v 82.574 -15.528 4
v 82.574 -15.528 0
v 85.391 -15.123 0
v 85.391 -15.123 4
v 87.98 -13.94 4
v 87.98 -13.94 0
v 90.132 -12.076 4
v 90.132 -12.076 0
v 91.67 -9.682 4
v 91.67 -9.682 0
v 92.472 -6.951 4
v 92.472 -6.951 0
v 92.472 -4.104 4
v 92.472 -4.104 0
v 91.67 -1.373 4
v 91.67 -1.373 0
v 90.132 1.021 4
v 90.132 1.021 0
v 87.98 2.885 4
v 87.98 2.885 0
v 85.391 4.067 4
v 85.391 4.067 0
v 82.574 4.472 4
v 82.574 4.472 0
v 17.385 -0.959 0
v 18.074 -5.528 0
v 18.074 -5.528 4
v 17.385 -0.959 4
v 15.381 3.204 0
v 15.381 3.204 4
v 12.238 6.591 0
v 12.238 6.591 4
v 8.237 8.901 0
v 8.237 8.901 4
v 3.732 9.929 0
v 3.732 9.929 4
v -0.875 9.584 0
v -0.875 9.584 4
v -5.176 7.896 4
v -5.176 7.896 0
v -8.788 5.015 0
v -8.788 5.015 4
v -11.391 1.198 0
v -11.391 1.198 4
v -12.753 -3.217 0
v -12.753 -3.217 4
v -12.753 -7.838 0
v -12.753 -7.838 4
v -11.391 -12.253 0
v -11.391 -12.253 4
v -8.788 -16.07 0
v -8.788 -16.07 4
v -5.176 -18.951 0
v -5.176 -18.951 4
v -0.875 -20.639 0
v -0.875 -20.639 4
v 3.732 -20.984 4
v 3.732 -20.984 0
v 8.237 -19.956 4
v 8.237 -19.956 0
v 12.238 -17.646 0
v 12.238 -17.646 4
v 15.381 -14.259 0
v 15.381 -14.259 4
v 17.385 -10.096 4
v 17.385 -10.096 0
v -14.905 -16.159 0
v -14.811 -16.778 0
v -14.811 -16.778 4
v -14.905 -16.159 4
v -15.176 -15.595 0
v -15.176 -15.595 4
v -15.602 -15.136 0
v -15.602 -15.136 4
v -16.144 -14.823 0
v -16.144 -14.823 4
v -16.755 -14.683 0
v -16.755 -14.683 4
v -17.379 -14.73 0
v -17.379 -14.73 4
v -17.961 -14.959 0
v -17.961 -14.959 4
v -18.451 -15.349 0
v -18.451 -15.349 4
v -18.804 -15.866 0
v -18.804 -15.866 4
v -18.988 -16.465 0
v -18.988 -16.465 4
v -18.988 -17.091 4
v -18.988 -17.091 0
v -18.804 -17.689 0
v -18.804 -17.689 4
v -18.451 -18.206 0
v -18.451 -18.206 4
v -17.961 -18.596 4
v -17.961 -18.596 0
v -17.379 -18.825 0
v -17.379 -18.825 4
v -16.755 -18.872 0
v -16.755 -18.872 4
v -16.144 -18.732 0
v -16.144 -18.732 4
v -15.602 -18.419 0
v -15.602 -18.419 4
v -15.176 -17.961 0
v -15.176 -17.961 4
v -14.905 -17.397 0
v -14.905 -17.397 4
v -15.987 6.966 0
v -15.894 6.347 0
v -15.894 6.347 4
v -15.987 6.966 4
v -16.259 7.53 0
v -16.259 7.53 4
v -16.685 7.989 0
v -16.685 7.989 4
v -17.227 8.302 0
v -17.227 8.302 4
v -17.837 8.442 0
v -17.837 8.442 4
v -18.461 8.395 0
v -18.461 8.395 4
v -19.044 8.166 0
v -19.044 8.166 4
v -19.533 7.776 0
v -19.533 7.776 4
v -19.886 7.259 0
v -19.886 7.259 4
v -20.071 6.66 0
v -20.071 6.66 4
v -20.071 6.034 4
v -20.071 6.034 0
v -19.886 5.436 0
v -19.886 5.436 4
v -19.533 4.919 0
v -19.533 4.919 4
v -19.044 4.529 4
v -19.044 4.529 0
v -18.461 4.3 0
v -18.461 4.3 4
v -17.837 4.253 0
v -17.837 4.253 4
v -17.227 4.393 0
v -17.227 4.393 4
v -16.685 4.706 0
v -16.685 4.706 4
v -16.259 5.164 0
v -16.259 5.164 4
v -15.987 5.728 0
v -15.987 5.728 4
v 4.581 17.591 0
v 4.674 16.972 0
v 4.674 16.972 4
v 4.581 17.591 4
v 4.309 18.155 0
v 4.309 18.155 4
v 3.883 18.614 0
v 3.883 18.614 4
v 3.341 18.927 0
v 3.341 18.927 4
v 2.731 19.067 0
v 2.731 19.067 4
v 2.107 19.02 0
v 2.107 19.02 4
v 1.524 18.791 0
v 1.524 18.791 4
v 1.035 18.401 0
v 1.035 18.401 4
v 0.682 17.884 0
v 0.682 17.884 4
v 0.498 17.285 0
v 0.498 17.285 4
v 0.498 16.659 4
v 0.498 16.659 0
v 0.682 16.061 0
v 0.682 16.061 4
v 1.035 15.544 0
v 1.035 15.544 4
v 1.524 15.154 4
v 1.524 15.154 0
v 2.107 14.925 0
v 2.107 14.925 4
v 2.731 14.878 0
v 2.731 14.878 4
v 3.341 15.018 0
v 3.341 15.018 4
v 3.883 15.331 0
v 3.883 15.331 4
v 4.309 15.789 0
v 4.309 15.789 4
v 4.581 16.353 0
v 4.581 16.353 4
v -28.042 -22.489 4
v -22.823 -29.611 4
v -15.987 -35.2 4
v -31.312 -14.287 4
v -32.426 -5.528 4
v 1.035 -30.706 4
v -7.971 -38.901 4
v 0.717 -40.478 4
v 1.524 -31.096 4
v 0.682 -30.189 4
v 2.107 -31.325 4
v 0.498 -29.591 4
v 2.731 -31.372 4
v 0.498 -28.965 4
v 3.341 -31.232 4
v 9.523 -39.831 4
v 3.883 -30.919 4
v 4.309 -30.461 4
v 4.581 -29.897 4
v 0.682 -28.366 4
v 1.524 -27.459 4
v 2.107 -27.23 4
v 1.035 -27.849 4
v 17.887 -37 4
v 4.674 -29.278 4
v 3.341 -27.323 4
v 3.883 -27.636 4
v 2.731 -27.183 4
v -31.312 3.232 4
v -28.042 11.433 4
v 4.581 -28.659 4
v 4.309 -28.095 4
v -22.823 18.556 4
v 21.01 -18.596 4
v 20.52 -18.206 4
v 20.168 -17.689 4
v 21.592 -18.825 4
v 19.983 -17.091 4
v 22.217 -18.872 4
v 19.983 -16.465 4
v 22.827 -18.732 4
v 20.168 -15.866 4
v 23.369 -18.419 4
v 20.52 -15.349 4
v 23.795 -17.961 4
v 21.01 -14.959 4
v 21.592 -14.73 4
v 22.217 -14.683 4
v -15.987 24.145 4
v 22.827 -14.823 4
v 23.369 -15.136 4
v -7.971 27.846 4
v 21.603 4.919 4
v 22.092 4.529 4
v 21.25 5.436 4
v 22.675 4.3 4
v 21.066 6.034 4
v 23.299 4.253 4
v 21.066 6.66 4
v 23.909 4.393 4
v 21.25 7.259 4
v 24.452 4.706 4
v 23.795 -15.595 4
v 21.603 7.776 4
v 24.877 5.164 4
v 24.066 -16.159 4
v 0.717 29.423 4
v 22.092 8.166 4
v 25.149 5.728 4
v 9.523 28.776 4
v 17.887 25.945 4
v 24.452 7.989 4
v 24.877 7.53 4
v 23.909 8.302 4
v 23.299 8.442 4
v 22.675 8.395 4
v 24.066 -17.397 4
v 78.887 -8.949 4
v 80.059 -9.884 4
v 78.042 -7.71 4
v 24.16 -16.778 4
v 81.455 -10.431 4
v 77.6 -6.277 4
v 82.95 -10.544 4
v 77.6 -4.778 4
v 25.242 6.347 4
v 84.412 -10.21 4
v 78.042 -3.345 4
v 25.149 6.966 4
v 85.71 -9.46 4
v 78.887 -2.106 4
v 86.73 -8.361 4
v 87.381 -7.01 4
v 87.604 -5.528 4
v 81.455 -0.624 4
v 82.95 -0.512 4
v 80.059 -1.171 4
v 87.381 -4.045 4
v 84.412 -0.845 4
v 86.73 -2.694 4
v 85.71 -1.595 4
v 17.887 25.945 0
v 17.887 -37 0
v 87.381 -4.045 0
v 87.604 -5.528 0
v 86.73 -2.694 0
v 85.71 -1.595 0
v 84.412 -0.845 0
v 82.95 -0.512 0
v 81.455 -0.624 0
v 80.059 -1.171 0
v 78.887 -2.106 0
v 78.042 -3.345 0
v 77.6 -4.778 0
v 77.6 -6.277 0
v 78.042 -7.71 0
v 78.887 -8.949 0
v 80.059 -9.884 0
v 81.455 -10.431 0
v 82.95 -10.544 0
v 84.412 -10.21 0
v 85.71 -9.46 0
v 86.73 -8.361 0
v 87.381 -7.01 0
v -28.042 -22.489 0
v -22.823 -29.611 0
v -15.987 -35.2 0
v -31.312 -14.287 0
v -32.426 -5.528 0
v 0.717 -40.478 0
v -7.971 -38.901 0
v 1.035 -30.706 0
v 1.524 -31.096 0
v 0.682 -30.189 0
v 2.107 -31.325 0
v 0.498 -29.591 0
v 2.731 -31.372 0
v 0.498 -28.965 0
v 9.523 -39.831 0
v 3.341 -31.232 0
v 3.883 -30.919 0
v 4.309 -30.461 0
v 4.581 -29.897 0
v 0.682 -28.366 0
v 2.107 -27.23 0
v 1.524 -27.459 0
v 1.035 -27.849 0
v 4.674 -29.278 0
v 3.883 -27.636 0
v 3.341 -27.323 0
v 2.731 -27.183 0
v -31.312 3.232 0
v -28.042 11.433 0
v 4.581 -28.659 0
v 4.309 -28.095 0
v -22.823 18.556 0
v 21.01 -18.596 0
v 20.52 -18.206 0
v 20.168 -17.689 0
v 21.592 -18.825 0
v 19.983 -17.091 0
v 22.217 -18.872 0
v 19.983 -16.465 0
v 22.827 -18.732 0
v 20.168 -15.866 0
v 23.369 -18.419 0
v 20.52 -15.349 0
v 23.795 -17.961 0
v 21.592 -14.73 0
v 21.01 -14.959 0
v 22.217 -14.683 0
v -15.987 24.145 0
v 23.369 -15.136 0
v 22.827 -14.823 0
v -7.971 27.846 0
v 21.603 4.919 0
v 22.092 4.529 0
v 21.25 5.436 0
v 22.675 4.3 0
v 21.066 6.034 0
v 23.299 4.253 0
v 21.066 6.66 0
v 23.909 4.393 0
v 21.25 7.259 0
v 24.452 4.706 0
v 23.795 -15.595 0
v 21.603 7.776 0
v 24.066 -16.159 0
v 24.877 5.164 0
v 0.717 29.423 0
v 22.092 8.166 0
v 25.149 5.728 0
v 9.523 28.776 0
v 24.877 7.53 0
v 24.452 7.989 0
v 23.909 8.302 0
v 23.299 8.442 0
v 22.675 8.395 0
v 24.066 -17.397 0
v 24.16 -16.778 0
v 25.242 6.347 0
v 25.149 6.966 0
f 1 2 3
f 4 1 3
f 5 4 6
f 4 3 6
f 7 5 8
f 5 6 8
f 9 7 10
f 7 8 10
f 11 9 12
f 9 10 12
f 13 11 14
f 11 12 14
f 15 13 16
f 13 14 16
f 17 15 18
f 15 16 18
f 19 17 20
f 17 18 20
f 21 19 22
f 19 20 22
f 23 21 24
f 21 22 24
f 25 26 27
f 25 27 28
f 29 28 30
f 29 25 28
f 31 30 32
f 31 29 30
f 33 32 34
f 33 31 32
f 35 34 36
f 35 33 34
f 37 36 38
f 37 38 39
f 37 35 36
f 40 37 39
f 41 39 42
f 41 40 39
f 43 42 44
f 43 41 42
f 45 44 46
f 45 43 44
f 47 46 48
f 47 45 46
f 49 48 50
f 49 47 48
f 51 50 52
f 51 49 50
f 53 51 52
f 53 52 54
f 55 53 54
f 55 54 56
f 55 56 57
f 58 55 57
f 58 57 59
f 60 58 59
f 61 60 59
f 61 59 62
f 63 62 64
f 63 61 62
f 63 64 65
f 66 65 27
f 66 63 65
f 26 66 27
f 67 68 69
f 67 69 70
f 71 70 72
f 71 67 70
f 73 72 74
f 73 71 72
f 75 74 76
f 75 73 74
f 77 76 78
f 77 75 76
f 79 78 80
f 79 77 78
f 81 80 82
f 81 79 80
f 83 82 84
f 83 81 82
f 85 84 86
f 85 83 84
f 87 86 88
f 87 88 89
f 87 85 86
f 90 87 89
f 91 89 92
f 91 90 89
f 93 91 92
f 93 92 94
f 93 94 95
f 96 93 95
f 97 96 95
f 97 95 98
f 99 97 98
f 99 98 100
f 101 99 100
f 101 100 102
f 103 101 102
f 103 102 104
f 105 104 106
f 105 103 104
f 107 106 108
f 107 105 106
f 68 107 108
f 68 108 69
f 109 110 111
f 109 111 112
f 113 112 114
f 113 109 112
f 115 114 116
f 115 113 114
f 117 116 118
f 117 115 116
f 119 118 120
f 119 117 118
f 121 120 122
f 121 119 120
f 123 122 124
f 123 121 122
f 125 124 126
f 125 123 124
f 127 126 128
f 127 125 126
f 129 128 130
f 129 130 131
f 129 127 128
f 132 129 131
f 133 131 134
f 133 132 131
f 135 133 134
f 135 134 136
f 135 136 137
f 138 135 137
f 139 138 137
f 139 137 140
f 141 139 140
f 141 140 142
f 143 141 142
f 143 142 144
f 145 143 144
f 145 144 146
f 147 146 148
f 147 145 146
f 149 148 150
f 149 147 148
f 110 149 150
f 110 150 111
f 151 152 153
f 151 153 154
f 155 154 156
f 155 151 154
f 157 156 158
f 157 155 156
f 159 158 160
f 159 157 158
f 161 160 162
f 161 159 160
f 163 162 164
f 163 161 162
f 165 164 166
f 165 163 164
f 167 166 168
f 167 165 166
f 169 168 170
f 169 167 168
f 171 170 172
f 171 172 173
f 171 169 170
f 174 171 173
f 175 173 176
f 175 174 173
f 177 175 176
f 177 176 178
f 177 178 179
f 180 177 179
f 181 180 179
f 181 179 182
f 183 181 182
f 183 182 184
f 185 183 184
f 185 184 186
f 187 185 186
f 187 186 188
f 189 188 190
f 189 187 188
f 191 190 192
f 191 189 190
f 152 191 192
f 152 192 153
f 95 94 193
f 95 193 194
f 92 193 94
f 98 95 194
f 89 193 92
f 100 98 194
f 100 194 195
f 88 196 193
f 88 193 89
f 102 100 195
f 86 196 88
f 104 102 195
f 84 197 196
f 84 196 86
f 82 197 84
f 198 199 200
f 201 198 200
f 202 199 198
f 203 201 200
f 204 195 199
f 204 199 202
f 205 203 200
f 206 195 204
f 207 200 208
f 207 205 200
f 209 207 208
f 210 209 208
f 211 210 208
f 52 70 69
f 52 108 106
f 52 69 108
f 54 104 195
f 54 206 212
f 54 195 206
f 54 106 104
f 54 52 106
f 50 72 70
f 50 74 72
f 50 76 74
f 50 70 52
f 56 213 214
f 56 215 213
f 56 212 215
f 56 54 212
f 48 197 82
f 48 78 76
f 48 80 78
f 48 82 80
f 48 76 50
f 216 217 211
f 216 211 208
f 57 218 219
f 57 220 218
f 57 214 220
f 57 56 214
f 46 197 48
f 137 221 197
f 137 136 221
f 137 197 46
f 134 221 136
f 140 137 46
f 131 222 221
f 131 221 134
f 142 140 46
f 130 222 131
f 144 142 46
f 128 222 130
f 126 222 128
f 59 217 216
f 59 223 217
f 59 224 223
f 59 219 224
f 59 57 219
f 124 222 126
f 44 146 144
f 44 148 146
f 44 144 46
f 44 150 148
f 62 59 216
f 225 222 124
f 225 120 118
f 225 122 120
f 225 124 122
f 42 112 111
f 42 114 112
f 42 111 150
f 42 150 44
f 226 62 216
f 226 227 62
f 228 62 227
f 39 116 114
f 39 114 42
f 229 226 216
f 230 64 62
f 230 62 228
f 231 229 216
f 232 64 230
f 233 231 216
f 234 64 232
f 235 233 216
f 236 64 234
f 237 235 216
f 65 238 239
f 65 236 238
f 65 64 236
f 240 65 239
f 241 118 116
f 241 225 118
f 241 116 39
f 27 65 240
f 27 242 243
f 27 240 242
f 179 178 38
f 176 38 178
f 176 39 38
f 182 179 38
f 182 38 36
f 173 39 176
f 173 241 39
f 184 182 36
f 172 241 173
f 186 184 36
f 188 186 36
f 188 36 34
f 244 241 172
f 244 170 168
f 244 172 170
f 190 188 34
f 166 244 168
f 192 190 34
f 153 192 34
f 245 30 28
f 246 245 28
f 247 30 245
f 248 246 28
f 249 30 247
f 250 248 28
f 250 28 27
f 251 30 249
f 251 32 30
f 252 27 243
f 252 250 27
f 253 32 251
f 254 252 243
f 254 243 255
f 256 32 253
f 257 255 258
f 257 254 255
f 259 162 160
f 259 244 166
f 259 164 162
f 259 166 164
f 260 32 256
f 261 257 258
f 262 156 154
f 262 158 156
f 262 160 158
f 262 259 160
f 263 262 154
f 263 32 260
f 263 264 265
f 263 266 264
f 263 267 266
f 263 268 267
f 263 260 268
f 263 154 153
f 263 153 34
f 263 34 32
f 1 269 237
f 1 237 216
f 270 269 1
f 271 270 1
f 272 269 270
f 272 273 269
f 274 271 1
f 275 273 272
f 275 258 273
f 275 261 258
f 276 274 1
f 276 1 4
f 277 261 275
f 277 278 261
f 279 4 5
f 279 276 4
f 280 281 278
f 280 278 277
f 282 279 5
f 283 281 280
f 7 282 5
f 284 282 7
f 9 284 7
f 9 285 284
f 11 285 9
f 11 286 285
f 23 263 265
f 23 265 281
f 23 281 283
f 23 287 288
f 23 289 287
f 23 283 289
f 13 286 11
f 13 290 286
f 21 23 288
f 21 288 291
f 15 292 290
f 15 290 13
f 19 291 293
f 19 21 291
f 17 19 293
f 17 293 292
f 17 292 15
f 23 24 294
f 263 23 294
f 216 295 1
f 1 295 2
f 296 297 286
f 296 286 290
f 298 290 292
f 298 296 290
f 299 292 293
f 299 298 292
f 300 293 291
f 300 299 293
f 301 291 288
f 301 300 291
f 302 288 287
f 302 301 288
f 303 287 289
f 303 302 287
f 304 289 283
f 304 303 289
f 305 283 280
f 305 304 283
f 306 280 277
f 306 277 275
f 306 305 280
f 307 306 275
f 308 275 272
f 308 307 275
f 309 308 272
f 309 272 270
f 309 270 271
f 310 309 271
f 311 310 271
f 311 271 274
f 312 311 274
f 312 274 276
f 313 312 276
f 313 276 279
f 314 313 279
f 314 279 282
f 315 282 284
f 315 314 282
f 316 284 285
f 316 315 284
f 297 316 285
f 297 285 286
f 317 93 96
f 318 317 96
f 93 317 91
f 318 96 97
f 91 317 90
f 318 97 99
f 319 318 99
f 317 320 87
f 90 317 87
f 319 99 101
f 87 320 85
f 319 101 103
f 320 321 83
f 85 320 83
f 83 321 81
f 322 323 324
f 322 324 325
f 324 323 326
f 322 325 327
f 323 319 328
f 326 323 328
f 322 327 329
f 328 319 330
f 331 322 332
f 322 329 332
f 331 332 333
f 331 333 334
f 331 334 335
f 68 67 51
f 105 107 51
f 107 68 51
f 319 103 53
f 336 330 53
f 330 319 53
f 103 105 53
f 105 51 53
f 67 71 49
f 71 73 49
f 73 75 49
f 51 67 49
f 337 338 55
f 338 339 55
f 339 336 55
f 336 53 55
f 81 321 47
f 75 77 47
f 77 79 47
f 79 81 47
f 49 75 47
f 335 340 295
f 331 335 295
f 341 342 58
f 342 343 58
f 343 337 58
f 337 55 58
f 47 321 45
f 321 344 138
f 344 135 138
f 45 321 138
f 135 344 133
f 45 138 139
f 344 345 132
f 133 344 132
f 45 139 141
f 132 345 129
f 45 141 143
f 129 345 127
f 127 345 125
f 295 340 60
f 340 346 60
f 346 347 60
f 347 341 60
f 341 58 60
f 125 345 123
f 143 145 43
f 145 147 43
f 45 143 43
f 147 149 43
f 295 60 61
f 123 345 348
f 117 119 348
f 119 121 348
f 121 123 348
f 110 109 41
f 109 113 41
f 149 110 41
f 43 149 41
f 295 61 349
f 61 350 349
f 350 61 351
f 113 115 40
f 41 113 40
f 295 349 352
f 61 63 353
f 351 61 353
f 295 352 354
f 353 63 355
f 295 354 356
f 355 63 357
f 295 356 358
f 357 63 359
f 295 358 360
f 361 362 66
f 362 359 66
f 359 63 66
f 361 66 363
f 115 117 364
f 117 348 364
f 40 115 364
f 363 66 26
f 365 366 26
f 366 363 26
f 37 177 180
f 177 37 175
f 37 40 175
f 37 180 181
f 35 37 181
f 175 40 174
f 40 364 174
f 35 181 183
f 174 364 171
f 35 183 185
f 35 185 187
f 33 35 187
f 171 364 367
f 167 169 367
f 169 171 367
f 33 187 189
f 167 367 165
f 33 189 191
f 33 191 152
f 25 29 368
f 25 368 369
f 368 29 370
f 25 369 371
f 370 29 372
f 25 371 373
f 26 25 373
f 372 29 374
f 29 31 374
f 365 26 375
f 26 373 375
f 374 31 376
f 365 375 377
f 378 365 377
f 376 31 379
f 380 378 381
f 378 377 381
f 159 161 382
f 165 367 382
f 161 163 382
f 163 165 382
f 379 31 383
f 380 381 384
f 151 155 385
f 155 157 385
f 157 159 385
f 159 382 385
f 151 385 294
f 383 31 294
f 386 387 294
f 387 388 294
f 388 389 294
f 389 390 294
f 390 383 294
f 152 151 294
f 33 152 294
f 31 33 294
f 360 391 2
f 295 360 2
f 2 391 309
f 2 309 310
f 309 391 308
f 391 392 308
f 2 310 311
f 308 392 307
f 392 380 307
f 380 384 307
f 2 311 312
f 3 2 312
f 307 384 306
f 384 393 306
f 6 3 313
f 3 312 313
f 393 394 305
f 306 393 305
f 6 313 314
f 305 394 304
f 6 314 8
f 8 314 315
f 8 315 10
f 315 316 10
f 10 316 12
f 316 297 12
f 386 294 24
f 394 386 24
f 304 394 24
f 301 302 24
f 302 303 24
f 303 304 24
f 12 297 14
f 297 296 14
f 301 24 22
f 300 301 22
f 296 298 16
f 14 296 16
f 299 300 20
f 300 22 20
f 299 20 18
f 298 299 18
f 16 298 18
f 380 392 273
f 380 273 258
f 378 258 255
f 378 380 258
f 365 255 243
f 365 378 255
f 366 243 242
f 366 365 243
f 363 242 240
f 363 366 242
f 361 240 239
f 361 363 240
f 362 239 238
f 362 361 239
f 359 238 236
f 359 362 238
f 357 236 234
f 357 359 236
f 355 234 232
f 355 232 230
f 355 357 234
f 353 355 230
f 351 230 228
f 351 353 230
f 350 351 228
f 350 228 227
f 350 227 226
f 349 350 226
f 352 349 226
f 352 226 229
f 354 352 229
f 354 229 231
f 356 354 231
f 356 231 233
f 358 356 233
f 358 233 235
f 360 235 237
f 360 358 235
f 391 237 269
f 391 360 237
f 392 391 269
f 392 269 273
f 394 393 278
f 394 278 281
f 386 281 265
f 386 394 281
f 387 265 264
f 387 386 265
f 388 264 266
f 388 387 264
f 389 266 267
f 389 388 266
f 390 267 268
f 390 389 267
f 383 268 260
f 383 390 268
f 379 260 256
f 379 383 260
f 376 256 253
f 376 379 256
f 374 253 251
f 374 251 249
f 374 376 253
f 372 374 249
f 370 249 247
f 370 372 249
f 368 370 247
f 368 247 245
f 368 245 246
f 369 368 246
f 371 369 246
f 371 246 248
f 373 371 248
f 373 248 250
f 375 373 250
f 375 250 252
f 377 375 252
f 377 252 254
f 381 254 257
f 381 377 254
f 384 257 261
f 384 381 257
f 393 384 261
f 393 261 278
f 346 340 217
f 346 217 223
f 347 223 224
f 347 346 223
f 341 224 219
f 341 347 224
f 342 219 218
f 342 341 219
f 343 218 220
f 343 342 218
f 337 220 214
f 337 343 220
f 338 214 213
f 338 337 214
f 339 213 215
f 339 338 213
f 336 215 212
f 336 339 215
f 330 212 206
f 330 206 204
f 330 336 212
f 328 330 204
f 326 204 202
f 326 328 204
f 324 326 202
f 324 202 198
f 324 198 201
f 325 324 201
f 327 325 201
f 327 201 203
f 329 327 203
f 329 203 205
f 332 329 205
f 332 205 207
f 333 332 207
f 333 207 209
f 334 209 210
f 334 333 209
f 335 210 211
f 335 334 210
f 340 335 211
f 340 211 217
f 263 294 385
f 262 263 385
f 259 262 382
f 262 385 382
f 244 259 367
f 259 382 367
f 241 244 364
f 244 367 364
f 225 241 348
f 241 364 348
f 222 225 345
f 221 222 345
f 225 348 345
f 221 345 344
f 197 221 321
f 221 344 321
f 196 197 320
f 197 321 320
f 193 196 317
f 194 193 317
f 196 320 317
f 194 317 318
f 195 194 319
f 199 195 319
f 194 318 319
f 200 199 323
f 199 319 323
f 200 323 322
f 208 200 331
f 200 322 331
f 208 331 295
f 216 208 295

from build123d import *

# Parameters (mm, degrees)
SKETCH_2_R      = 2.1
SKETCH_2_R_2    = 15.5
SKETCH_2_R_3    = 5.03
EXTRUDE_1_DEPTH = 4


with BuildPart() as part:
    # 草图2 → 凸台-拉伸1 (new body)
    with BuildSketch(Plane.XY):
        with BuildLine():
            Line((82.574074367, 4.472412166), (17.886574367, 25.945056537))
            ThreePointArc((17.886574367, 25.945056537), (-32.425925633, -5.527587834), (17.886574367, -37.000232206))
            Line((17.886574367, -37.000232206), (82.574074367, -15.527587834))
            ThreePointArc((82.574074367, -15.527587834), (92.574074367, -5.527587834), (82.574074367, 4.472412166))
        make_face()
        with Locations((2.574074367, -29.277587834)):
            Circle(SKETCH_2_R, mode=Mode.SUBTRACT)
        with Locations((22.059645952, -16.777587834)):
            Circle(SKETCH_2_R, mode=Mode.SUBTRACT)
        with Locations((2.574074367, -5.527587834)):
            Circle(SKETCH_2_R_2, mode=Mode.SUBTRACT)
        with Locations((82.574074367, -5.527587834)):
            Circle(SKETCH_2_R_3, mode=Mode.SUBTRACT)
        with Locations((-17.994028973, 6.347412166)):
            Circle(SKETCH_2_R, mode=Mode.SUBTRACT)
        with Locations((23.142177707, 6.347412166)):
            Circle(SKETCH_2_R, mode=Mode.SUBTRACT)
        with Locations((2.574074367, 16.972412166)):
            Circle(SKETCH_2_R, mode=Mode.SUBTRACT)
        with Locations((-16.911497218, -16.777587834)):
            Circle(SKETCH_2_R, mode=Mode.SUBTRACT)
    extrude(amount=EXTRUDE_1_DEPTH)


solid = part.part
